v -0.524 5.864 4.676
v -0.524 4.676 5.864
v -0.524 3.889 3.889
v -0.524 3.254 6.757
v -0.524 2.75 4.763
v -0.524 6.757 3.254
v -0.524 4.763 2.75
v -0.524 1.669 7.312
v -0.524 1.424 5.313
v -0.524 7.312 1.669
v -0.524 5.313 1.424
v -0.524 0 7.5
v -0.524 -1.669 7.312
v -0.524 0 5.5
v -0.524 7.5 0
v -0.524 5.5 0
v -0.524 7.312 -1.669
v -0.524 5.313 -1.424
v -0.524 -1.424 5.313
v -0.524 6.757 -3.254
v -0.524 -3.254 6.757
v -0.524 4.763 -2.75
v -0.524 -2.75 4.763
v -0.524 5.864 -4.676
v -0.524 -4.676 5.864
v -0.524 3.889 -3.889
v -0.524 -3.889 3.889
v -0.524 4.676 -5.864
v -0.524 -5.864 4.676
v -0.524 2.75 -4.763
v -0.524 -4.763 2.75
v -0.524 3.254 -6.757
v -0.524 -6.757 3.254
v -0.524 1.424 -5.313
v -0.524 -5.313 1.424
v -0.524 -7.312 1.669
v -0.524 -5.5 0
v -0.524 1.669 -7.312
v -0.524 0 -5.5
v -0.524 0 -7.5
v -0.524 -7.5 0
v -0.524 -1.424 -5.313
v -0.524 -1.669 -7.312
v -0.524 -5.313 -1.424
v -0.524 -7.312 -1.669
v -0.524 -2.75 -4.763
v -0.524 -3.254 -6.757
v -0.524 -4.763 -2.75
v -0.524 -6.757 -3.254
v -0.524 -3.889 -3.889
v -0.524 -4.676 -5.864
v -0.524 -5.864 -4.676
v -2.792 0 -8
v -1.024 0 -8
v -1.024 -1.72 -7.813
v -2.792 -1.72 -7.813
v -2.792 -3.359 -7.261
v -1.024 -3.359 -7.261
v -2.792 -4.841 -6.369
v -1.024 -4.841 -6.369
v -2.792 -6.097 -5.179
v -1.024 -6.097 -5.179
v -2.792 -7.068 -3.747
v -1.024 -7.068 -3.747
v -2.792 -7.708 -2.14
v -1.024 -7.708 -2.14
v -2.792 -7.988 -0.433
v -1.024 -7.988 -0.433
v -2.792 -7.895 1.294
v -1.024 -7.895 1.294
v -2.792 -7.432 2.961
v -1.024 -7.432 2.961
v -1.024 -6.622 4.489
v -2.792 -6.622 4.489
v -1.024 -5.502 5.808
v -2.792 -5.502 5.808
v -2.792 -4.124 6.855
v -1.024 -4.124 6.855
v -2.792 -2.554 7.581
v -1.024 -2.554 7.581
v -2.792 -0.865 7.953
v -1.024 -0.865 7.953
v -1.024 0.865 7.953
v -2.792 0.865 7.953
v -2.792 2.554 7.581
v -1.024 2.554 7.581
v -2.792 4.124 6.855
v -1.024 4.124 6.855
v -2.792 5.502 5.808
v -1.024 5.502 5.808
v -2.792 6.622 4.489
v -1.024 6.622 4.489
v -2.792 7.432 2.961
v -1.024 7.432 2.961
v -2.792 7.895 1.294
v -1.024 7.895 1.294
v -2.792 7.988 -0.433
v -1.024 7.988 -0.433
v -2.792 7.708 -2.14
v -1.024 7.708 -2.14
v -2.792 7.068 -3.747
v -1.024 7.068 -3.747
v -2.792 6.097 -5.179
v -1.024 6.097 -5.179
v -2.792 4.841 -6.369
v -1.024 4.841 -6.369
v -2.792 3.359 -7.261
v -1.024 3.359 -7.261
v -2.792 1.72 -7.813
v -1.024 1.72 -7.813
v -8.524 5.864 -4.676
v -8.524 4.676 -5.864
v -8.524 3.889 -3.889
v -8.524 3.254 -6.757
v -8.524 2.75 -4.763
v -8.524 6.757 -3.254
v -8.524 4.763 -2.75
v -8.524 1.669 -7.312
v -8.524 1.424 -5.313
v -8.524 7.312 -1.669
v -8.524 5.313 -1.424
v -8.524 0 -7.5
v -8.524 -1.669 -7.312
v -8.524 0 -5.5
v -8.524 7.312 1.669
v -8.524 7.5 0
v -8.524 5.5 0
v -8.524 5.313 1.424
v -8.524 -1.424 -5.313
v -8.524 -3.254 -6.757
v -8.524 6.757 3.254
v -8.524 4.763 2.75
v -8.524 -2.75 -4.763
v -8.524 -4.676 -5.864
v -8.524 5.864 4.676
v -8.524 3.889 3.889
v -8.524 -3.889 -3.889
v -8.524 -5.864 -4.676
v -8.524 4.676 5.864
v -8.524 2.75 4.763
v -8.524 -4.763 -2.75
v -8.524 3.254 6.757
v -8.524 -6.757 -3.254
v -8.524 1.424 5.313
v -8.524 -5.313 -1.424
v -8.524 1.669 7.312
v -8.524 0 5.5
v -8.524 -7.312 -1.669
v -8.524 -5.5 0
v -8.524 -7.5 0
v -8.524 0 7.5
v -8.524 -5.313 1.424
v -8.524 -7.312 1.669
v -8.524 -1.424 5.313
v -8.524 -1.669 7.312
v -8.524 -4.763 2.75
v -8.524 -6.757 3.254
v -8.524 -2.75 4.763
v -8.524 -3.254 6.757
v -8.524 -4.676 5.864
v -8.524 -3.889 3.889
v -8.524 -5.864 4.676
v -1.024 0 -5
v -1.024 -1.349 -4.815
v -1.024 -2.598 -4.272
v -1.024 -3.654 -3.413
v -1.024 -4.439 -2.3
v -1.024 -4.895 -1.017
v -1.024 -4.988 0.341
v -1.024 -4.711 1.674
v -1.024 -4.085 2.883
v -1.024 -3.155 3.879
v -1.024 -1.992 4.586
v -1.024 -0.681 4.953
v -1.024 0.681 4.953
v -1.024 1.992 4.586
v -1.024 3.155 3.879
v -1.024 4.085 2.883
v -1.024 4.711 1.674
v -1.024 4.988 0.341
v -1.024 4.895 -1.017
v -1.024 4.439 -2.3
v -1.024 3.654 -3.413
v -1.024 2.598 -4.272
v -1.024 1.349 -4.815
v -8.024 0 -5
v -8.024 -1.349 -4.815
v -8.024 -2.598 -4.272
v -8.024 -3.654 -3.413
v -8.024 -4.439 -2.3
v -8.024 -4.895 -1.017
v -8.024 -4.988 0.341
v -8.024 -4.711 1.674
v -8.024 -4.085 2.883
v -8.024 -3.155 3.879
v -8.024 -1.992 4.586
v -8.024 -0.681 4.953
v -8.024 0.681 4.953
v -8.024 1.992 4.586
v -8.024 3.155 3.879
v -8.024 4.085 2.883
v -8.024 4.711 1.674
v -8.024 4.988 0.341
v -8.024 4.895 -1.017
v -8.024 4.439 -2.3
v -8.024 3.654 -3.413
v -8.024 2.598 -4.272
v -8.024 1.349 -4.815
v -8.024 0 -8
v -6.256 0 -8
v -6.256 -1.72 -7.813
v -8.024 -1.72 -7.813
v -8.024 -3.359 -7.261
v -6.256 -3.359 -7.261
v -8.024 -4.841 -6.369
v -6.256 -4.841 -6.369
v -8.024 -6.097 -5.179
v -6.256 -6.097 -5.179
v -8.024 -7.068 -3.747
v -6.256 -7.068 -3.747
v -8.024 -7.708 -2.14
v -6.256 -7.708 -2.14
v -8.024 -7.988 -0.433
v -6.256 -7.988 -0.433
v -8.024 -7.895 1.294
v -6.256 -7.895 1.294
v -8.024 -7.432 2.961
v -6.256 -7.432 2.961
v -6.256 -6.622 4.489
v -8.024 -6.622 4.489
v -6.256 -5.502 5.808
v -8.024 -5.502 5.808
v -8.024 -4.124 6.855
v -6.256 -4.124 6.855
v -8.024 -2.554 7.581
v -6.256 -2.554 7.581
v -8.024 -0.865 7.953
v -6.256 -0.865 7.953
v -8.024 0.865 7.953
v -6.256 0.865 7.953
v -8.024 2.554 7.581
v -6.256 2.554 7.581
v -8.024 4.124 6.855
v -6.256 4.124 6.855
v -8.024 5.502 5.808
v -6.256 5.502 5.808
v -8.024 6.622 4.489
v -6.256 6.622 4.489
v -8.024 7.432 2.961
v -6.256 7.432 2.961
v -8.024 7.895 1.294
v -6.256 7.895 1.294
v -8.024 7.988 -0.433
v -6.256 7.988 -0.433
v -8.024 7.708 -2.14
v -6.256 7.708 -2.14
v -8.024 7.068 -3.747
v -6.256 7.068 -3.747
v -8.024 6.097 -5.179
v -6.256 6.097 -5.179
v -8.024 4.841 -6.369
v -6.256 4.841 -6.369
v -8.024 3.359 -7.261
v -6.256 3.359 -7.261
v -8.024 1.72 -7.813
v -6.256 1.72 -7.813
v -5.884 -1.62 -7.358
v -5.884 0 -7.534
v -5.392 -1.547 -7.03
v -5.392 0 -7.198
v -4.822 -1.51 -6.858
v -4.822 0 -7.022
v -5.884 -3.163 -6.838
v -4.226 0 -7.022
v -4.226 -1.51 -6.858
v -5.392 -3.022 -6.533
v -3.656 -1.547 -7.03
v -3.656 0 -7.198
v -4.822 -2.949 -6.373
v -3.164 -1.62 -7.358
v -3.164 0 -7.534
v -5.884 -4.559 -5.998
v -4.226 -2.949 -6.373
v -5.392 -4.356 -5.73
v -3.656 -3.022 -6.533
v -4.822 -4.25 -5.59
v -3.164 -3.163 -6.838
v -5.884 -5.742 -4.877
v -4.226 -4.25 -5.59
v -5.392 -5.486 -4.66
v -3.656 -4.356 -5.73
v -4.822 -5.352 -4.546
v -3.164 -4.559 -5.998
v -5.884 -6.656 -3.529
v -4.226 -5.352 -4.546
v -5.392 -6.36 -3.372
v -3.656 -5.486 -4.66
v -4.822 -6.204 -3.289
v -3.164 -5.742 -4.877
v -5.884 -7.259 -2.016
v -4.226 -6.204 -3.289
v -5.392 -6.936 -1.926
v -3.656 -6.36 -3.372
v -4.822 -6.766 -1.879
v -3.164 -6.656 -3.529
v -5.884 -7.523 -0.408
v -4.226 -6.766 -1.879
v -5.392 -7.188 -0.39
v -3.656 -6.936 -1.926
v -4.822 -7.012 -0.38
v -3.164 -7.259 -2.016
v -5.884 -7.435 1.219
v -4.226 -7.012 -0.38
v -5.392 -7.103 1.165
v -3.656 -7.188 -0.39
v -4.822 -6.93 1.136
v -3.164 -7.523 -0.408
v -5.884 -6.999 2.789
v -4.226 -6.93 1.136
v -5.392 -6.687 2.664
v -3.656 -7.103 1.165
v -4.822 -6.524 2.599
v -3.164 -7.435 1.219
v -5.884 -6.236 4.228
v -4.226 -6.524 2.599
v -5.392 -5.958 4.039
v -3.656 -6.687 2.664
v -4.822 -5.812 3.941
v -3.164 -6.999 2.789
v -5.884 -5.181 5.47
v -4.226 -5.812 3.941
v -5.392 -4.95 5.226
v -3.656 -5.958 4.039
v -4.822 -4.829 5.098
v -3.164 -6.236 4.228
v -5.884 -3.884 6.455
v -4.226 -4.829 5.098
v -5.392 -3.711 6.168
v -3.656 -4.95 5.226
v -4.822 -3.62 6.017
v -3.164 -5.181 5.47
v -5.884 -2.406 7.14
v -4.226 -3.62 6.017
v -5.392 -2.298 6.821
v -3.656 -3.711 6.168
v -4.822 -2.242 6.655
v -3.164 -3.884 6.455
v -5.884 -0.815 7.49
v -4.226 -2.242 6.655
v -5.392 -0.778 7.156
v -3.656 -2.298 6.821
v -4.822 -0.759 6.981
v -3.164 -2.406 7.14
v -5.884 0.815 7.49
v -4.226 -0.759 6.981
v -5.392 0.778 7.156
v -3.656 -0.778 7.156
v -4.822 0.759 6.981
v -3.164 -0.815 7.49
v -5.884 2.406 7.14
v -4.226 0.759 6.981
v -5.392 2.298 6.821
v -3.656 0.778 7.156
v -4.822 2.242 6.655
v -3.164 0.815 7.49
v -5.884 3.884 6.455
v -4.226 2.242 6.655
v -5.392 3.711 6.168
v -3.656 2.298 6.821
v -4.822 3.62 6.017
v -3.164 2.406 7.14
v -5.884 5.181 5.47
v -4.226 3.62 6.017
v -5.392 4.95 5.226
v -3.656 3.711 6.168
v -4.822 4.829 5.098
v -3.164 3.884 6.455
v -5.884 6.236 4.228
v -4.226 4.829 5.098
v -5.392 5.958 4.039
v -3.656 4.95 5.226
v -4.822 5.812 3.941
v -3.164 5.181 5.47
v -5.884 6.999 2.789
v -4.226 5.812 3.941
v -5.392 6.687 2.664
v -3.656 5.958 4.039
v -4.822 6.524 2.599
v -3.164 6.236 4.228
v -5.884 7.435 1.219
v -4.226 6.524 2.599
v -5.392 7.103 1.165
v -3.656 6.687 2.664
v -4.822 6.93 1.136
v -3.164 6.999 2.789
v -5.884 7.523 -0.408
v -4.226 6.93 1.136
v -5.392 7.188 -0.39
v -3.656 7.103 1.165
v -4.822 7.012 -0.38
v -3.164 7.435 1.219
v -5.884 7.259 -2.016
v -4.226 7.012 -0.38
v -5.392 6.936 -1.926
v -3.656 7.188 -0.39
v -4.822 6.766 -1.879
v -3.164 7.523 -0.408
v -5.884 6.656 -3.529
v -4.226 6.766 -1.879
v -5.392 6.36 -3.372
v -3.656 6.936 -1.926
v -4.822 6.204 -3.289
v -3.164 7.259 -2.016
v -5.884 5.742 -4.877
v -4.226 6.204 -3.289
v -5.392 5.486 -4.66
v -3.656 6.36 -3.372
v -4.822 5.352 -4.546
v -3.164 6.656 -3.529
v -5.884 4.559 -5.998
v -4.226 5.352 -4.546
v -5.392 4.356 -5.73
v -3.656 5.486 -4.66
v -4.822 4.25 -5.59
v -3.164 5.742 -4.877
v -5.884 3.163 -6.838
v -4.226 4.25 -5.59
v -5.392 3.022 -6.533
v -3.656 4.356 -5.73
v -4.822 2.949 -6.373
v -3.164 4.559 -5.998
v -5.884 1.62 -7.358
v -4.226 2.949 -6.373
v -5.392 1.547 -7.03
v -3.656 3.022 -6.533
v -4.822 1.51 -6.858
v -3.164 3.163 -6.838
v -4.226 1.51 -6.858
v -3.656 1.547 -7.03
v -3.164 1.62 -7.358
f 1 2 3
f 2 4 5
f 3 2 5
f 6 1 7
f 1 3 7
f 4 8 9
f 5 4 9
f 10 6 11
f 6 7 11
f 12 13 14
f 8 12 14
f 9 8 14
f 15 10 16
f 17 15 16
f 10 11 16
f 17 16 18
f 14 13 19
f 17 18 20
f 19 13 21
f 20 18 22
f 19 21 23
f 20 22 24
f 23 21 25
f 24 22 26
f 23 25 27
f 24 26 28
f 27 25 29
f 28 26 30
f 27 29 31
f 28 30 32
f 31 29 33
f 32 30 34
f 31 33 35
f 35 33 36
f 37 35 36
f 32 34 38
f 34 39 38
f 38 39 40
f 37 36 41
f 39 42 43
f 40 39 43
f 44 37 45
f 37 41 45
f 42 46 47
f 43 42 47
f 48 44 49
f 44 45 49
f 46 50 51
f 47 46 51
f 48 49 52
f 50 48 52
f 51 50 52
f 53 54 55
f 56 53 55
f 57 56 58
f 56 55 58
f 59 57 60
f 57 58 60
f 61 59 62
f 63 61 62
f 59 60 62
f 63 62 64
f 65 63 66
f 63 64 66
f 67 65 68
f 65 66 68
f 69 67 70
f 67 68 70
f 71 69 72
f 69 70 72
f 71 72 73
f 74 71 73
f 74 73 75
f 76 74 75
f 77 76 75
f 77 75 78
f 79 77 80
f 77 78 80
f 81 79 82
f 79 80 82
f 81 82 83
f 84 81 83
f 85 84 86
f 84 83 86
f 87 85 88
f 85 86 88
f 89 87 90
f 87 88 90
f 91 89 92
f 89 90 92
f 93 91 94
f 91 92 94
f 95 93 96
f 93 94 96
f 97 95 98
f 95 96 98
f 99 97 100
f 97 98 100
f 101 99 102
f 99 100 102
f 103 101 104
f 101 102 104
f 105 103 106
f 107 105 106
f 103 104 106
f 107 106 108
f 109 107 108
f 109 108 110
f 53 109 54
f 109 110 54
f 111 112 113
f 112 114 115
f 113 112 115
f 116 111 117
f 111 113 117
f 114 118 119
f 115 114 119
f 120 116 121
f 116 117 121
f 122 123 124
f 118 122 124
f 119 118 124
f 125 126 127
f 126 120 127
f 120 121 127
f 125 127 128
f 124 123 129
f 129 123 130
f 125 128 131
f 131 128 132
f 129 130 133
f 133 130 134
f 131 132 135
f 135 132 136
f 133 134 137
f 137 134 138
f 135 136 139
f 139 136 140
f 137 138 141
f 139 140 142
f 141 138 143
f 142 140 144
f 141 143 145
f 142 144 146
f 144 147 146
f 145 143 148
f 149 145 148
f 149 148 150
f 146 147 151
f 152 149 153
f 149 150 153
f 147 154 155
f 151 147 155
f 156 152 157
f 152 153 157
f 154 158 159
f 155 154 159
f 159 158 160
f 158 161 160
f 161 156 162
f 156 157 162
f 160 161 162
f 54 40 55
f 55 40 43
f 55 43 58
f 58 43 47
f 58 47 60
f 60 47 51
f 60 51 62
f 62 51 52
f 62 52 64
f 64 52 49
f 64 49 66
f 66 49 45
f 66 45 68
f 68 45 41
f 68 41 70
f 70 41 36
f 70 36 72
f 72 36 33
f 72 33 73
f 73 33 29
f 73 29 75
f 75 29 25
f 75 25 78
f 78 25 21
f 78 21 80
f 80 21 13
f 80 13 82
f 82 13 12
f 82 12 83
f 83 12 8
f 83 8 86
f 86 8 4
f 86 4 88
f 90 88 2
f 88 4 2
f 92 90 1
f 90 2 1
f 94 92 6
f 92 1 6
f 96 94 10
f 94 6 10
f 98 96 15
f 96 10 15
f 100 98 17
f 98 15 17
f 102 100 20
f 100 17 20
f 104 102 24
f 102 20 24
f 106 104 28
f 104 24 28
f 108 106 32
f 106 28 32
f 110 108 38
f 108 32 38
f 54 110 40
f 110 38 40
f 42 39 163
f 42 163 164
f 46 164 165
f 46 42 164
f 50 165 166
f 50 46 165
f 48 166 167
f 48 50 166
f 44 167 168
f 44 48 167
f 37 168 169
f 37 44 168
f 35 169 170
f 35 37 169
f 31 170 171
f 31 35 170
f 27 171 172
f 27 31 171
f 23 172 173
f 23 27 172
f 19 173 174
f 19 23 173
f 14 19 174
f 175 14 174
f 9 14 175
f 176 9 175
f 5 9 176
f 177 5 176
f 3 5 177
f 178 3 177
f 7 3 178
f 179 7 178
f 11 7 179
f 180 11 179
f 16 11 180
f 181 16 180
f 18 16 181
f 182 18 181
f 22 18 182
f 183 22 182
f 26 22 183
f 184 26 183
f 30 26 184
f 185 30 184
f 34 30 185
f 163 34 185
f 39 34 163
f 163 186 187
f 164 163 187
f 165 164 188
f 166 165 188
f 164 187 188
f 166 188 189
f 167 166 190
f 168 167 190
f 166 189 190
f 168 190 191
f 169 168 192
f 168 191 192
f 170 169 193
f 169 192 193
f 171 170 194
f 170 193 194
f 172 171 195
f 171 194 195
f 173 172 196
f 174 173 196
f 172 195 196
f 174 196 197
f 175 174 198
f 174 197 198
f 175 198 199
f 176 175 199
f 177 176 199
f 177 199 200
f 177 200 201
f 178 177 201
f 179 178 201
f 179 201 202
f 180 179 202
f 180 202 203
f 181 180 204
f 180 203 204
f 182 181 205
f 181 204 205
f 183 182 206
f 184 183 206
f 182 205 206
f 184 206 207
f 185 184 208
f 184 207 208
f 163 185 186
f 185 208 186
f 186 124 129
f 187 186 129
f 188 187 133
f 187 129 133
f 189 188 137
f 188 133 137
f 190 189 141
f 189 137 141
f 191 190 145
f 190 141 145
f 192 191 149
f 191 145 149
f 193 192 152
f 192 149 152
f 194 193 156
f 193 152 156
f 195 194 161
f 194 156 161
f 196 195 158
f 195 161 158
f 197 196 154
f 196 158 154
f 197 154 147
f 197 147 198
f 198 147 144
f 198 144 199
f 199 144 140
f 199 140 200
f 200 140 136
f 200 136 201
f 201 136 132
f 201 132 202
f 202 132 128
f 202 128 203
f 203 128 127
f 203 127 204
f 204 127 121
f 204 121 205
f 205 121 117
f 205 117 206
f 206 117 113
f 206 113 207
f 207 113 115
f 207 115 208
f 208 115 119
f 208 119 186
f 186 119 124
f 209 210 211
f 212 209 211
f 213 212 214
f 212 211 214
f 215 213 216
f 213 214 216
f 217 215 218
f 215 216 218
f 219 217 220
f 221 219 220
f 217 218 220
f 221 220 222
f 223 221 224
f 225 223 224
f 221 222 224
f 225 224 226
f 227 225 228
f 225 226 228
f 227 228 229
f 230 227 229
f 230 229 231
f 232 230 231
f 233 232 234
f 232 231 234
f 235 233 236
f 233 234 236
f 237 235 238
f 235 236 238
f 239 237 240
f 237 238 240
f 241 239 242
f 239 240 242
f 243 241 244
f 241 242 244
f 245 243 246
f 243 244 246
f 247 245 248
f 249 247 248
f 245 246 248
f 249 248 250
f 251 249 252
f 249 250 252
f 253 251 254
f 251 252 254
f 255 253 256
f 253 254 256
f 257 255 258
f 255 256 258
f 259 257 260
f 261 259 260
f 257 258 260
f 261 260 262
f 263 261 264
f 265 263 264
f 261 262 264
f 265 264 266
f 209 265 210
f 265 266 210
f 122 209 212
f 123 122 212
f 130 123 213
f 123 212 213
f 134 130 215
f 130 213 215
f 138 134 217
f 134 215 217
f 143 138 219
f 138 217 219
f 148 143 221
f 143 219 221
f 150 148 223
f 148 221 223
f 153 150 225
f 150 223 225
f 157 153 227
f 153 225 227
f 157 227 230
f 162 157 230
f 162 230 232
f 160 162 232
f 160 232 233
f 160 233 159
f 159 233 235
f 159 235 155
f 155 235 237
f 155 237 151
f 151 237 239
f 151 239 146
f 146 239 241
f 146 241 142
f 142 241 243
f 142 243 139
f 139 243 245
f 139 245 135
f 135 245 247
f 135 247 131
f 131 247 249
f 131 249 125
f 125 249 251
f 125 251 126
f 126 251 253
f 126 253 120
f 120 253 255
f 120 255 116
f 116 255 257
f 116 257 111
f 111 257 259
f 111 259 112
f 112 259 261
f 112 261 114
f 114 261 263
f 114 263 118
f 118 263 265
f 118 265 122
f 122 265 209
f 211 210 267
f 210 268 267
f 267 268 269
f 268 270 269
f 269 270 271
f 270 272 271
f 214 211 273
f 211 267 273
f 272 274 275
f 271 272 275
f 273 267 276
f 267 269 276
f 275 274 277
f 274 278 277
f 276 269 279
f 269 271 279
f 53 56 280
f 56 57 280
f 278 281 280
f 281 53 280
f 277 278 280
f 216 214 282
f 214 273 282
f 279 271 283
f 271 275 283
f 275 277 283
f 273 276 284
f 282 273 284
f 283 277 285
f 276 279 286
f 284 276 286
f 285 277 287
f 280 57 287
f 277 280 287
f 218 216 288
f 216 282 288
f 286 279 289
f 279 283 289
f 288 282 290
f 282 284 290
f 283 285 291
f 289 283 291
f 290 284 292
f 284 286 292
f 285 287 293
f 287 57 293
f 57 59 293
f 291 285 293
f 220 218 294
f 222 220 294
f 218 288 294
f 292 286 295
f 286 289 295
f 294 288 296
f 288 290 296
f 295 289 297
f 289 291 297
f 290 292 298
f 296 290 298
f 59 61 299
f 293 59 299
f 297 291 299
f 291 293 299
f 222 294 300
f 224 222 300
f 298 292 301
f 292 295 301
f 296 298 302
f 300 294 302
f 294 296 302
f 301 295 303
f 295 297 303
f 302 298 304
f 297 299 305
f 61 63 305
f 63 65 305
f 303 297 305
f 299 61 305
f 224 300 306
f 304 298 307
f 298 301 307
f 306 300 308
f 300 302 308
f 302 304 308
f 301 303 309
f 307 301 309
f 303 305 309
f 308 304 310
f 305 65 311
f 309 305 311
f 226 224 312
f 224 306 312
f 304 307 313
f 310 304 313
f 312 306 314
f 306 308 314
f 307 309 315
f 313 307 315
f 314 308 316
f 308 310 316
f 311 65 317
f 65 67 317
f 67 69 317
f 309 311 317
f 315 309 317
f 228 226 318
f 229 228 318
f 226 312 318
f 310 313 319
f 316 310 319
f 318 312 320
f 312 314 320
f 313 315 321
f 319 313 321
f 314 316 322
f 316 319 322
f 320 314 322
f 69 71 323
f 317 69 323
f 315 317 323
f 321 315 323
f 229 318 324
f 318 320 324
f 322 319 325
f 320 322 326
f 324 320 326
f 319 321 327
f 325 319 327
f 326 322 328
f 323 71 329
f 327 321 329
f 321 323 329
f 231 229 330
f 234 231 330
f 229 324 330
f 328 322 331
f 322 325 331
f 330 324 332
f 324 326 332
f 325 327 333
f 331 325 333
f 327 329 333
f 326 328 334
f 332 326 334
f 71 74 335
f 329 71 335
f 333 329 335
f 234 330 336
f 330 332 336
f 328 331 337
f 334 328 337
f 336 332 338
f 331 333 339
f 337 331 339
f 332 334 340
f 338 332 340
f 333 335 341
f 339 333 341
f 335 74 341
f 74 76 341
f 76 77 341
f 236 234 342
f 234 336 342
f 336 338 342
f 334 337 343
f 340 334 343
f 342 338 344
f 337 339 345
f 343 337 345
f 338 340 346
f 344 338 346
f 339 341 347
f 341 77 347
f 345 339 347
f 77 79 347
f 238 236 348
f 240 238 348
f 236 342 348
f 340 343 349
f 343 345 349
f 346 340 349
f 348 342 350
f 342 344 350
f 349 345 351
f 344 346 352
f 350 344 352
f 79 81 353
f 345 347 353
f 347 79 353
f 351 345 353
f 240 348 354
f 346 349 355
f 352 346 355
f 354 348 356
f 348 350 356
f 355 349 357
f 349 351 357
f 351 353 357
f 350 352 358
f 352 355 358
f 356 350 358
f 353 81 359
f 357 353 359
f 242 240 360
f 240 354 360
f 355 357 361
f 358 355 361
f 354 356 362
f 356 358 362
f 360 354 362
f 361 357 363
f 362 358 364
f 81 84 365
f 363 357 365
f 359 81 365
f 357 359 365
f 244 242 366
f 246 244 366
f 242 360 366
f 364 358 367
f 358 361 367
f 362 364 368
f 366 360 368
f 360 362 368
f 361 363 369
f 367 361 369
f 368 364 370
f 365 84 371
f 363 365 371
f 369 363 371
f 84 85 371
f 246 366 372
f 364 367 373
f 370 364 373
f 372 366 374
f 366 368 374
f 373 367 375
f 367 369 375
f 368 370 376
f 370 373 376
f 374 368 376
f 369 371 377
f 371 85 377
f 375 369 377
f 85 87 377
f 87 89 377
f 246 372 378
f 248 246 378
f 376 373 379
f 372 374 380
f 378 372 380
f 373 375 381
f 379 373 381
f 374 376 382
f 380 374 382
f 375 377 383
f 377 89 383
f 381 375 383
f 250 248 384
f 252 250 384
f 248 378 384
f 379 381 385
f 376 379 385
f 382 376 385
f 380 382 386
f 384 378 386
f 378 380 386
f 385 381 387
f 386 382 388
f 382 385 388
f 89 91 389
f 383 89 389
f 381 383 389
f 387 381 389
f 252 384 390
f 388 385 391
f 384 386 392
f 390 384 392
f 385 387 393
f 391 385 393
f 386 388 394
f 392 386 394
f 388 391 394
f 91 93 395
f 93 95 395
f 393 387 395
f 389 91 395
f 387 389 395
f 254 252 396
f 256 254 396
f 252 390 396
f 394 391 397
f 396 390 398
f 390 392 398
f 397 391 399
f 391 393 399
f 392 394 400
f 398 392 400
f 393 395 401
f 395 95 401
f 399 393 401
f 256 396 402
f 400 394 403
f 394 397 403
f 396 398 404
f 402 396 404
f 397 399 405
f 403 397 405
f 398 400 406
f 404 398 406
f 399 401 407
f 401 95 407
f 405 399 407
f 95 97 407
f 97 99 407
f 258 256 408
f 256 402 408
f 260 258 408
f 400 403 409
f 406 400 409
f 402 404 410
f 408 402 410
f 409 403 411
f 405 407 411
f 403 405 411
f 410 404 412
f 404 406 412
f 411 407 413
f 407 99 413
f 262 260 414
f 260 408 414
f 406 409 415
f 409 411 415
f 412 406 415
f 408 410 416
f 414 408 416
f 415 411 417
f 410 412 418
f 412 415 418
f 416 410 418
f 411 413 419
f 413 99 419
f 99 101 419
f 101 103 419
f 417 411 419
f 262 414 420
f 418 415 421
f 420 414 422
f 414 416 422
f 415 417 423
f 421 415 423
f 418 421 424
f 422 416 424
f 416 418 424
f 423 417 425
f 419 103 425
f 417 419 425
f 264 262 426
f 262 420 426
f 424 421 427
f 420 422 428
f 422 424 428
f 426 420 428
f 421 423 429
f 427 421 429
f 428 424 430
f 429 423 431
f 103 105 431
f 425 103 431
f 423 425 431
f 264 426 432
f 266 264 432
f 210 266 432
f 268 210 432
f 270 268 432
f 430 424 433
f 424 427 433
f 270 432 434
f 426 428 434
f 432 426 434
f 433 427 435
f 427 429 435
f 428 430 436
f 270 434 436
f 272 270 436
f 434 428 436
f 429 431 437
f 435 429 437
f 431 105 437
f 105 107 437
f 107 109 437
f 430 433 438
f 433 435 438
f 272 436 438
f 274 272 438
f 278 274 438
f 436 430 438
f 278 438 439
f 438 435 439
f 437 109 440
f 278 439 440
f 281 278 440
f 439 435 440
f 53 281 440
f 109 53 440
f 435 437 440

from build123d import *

# Parameters (mm, degrees)
PAH1_SIZE = 0.5


with BuildPart() as part:
    # Çizim1 → Döndür1 (revolve)
    with BuildSketch(Plane.XY, mode=Mode.PRIVATE) as d_nd_r1_sk:
        with BuildLine():
            Line((-0.523961526, 5), (-8.523961526, 5))
            Line((-8.523961526, 5), (-8.523961526, 8))
            Line((-8.523961526, 8), (-6.256012333, 8))
            ThreePointArc((-6.256012333, 8), (-4.523961526, 7), (-2.791910718, 8))
            Line((-2.791910718, 8), (-0.523961526, 8))
            Line((-0.523961526, 8), (-0.523961526, 5))
        make_face()
    revolve(d_nd_r1_sk.sketch.rotate(Axis((0, 0, 0), (-1, 0, 0)), 90), axis=Axis((0, 0, 0), (-1, 0, 0)))

    # Pah1
    pah1_edges = [part.edges().sort_by_distance(p)[0] for p in [
        (-0.523961526, 0, 5),
        (-8.523961526, 0, 5),
        (-8.523961526, 0, 8),
        (-0.523961526, 0, 8),
    ]]
    chamfer(pah1_edges, length=PAH1_SIZE)


solid = part.part
